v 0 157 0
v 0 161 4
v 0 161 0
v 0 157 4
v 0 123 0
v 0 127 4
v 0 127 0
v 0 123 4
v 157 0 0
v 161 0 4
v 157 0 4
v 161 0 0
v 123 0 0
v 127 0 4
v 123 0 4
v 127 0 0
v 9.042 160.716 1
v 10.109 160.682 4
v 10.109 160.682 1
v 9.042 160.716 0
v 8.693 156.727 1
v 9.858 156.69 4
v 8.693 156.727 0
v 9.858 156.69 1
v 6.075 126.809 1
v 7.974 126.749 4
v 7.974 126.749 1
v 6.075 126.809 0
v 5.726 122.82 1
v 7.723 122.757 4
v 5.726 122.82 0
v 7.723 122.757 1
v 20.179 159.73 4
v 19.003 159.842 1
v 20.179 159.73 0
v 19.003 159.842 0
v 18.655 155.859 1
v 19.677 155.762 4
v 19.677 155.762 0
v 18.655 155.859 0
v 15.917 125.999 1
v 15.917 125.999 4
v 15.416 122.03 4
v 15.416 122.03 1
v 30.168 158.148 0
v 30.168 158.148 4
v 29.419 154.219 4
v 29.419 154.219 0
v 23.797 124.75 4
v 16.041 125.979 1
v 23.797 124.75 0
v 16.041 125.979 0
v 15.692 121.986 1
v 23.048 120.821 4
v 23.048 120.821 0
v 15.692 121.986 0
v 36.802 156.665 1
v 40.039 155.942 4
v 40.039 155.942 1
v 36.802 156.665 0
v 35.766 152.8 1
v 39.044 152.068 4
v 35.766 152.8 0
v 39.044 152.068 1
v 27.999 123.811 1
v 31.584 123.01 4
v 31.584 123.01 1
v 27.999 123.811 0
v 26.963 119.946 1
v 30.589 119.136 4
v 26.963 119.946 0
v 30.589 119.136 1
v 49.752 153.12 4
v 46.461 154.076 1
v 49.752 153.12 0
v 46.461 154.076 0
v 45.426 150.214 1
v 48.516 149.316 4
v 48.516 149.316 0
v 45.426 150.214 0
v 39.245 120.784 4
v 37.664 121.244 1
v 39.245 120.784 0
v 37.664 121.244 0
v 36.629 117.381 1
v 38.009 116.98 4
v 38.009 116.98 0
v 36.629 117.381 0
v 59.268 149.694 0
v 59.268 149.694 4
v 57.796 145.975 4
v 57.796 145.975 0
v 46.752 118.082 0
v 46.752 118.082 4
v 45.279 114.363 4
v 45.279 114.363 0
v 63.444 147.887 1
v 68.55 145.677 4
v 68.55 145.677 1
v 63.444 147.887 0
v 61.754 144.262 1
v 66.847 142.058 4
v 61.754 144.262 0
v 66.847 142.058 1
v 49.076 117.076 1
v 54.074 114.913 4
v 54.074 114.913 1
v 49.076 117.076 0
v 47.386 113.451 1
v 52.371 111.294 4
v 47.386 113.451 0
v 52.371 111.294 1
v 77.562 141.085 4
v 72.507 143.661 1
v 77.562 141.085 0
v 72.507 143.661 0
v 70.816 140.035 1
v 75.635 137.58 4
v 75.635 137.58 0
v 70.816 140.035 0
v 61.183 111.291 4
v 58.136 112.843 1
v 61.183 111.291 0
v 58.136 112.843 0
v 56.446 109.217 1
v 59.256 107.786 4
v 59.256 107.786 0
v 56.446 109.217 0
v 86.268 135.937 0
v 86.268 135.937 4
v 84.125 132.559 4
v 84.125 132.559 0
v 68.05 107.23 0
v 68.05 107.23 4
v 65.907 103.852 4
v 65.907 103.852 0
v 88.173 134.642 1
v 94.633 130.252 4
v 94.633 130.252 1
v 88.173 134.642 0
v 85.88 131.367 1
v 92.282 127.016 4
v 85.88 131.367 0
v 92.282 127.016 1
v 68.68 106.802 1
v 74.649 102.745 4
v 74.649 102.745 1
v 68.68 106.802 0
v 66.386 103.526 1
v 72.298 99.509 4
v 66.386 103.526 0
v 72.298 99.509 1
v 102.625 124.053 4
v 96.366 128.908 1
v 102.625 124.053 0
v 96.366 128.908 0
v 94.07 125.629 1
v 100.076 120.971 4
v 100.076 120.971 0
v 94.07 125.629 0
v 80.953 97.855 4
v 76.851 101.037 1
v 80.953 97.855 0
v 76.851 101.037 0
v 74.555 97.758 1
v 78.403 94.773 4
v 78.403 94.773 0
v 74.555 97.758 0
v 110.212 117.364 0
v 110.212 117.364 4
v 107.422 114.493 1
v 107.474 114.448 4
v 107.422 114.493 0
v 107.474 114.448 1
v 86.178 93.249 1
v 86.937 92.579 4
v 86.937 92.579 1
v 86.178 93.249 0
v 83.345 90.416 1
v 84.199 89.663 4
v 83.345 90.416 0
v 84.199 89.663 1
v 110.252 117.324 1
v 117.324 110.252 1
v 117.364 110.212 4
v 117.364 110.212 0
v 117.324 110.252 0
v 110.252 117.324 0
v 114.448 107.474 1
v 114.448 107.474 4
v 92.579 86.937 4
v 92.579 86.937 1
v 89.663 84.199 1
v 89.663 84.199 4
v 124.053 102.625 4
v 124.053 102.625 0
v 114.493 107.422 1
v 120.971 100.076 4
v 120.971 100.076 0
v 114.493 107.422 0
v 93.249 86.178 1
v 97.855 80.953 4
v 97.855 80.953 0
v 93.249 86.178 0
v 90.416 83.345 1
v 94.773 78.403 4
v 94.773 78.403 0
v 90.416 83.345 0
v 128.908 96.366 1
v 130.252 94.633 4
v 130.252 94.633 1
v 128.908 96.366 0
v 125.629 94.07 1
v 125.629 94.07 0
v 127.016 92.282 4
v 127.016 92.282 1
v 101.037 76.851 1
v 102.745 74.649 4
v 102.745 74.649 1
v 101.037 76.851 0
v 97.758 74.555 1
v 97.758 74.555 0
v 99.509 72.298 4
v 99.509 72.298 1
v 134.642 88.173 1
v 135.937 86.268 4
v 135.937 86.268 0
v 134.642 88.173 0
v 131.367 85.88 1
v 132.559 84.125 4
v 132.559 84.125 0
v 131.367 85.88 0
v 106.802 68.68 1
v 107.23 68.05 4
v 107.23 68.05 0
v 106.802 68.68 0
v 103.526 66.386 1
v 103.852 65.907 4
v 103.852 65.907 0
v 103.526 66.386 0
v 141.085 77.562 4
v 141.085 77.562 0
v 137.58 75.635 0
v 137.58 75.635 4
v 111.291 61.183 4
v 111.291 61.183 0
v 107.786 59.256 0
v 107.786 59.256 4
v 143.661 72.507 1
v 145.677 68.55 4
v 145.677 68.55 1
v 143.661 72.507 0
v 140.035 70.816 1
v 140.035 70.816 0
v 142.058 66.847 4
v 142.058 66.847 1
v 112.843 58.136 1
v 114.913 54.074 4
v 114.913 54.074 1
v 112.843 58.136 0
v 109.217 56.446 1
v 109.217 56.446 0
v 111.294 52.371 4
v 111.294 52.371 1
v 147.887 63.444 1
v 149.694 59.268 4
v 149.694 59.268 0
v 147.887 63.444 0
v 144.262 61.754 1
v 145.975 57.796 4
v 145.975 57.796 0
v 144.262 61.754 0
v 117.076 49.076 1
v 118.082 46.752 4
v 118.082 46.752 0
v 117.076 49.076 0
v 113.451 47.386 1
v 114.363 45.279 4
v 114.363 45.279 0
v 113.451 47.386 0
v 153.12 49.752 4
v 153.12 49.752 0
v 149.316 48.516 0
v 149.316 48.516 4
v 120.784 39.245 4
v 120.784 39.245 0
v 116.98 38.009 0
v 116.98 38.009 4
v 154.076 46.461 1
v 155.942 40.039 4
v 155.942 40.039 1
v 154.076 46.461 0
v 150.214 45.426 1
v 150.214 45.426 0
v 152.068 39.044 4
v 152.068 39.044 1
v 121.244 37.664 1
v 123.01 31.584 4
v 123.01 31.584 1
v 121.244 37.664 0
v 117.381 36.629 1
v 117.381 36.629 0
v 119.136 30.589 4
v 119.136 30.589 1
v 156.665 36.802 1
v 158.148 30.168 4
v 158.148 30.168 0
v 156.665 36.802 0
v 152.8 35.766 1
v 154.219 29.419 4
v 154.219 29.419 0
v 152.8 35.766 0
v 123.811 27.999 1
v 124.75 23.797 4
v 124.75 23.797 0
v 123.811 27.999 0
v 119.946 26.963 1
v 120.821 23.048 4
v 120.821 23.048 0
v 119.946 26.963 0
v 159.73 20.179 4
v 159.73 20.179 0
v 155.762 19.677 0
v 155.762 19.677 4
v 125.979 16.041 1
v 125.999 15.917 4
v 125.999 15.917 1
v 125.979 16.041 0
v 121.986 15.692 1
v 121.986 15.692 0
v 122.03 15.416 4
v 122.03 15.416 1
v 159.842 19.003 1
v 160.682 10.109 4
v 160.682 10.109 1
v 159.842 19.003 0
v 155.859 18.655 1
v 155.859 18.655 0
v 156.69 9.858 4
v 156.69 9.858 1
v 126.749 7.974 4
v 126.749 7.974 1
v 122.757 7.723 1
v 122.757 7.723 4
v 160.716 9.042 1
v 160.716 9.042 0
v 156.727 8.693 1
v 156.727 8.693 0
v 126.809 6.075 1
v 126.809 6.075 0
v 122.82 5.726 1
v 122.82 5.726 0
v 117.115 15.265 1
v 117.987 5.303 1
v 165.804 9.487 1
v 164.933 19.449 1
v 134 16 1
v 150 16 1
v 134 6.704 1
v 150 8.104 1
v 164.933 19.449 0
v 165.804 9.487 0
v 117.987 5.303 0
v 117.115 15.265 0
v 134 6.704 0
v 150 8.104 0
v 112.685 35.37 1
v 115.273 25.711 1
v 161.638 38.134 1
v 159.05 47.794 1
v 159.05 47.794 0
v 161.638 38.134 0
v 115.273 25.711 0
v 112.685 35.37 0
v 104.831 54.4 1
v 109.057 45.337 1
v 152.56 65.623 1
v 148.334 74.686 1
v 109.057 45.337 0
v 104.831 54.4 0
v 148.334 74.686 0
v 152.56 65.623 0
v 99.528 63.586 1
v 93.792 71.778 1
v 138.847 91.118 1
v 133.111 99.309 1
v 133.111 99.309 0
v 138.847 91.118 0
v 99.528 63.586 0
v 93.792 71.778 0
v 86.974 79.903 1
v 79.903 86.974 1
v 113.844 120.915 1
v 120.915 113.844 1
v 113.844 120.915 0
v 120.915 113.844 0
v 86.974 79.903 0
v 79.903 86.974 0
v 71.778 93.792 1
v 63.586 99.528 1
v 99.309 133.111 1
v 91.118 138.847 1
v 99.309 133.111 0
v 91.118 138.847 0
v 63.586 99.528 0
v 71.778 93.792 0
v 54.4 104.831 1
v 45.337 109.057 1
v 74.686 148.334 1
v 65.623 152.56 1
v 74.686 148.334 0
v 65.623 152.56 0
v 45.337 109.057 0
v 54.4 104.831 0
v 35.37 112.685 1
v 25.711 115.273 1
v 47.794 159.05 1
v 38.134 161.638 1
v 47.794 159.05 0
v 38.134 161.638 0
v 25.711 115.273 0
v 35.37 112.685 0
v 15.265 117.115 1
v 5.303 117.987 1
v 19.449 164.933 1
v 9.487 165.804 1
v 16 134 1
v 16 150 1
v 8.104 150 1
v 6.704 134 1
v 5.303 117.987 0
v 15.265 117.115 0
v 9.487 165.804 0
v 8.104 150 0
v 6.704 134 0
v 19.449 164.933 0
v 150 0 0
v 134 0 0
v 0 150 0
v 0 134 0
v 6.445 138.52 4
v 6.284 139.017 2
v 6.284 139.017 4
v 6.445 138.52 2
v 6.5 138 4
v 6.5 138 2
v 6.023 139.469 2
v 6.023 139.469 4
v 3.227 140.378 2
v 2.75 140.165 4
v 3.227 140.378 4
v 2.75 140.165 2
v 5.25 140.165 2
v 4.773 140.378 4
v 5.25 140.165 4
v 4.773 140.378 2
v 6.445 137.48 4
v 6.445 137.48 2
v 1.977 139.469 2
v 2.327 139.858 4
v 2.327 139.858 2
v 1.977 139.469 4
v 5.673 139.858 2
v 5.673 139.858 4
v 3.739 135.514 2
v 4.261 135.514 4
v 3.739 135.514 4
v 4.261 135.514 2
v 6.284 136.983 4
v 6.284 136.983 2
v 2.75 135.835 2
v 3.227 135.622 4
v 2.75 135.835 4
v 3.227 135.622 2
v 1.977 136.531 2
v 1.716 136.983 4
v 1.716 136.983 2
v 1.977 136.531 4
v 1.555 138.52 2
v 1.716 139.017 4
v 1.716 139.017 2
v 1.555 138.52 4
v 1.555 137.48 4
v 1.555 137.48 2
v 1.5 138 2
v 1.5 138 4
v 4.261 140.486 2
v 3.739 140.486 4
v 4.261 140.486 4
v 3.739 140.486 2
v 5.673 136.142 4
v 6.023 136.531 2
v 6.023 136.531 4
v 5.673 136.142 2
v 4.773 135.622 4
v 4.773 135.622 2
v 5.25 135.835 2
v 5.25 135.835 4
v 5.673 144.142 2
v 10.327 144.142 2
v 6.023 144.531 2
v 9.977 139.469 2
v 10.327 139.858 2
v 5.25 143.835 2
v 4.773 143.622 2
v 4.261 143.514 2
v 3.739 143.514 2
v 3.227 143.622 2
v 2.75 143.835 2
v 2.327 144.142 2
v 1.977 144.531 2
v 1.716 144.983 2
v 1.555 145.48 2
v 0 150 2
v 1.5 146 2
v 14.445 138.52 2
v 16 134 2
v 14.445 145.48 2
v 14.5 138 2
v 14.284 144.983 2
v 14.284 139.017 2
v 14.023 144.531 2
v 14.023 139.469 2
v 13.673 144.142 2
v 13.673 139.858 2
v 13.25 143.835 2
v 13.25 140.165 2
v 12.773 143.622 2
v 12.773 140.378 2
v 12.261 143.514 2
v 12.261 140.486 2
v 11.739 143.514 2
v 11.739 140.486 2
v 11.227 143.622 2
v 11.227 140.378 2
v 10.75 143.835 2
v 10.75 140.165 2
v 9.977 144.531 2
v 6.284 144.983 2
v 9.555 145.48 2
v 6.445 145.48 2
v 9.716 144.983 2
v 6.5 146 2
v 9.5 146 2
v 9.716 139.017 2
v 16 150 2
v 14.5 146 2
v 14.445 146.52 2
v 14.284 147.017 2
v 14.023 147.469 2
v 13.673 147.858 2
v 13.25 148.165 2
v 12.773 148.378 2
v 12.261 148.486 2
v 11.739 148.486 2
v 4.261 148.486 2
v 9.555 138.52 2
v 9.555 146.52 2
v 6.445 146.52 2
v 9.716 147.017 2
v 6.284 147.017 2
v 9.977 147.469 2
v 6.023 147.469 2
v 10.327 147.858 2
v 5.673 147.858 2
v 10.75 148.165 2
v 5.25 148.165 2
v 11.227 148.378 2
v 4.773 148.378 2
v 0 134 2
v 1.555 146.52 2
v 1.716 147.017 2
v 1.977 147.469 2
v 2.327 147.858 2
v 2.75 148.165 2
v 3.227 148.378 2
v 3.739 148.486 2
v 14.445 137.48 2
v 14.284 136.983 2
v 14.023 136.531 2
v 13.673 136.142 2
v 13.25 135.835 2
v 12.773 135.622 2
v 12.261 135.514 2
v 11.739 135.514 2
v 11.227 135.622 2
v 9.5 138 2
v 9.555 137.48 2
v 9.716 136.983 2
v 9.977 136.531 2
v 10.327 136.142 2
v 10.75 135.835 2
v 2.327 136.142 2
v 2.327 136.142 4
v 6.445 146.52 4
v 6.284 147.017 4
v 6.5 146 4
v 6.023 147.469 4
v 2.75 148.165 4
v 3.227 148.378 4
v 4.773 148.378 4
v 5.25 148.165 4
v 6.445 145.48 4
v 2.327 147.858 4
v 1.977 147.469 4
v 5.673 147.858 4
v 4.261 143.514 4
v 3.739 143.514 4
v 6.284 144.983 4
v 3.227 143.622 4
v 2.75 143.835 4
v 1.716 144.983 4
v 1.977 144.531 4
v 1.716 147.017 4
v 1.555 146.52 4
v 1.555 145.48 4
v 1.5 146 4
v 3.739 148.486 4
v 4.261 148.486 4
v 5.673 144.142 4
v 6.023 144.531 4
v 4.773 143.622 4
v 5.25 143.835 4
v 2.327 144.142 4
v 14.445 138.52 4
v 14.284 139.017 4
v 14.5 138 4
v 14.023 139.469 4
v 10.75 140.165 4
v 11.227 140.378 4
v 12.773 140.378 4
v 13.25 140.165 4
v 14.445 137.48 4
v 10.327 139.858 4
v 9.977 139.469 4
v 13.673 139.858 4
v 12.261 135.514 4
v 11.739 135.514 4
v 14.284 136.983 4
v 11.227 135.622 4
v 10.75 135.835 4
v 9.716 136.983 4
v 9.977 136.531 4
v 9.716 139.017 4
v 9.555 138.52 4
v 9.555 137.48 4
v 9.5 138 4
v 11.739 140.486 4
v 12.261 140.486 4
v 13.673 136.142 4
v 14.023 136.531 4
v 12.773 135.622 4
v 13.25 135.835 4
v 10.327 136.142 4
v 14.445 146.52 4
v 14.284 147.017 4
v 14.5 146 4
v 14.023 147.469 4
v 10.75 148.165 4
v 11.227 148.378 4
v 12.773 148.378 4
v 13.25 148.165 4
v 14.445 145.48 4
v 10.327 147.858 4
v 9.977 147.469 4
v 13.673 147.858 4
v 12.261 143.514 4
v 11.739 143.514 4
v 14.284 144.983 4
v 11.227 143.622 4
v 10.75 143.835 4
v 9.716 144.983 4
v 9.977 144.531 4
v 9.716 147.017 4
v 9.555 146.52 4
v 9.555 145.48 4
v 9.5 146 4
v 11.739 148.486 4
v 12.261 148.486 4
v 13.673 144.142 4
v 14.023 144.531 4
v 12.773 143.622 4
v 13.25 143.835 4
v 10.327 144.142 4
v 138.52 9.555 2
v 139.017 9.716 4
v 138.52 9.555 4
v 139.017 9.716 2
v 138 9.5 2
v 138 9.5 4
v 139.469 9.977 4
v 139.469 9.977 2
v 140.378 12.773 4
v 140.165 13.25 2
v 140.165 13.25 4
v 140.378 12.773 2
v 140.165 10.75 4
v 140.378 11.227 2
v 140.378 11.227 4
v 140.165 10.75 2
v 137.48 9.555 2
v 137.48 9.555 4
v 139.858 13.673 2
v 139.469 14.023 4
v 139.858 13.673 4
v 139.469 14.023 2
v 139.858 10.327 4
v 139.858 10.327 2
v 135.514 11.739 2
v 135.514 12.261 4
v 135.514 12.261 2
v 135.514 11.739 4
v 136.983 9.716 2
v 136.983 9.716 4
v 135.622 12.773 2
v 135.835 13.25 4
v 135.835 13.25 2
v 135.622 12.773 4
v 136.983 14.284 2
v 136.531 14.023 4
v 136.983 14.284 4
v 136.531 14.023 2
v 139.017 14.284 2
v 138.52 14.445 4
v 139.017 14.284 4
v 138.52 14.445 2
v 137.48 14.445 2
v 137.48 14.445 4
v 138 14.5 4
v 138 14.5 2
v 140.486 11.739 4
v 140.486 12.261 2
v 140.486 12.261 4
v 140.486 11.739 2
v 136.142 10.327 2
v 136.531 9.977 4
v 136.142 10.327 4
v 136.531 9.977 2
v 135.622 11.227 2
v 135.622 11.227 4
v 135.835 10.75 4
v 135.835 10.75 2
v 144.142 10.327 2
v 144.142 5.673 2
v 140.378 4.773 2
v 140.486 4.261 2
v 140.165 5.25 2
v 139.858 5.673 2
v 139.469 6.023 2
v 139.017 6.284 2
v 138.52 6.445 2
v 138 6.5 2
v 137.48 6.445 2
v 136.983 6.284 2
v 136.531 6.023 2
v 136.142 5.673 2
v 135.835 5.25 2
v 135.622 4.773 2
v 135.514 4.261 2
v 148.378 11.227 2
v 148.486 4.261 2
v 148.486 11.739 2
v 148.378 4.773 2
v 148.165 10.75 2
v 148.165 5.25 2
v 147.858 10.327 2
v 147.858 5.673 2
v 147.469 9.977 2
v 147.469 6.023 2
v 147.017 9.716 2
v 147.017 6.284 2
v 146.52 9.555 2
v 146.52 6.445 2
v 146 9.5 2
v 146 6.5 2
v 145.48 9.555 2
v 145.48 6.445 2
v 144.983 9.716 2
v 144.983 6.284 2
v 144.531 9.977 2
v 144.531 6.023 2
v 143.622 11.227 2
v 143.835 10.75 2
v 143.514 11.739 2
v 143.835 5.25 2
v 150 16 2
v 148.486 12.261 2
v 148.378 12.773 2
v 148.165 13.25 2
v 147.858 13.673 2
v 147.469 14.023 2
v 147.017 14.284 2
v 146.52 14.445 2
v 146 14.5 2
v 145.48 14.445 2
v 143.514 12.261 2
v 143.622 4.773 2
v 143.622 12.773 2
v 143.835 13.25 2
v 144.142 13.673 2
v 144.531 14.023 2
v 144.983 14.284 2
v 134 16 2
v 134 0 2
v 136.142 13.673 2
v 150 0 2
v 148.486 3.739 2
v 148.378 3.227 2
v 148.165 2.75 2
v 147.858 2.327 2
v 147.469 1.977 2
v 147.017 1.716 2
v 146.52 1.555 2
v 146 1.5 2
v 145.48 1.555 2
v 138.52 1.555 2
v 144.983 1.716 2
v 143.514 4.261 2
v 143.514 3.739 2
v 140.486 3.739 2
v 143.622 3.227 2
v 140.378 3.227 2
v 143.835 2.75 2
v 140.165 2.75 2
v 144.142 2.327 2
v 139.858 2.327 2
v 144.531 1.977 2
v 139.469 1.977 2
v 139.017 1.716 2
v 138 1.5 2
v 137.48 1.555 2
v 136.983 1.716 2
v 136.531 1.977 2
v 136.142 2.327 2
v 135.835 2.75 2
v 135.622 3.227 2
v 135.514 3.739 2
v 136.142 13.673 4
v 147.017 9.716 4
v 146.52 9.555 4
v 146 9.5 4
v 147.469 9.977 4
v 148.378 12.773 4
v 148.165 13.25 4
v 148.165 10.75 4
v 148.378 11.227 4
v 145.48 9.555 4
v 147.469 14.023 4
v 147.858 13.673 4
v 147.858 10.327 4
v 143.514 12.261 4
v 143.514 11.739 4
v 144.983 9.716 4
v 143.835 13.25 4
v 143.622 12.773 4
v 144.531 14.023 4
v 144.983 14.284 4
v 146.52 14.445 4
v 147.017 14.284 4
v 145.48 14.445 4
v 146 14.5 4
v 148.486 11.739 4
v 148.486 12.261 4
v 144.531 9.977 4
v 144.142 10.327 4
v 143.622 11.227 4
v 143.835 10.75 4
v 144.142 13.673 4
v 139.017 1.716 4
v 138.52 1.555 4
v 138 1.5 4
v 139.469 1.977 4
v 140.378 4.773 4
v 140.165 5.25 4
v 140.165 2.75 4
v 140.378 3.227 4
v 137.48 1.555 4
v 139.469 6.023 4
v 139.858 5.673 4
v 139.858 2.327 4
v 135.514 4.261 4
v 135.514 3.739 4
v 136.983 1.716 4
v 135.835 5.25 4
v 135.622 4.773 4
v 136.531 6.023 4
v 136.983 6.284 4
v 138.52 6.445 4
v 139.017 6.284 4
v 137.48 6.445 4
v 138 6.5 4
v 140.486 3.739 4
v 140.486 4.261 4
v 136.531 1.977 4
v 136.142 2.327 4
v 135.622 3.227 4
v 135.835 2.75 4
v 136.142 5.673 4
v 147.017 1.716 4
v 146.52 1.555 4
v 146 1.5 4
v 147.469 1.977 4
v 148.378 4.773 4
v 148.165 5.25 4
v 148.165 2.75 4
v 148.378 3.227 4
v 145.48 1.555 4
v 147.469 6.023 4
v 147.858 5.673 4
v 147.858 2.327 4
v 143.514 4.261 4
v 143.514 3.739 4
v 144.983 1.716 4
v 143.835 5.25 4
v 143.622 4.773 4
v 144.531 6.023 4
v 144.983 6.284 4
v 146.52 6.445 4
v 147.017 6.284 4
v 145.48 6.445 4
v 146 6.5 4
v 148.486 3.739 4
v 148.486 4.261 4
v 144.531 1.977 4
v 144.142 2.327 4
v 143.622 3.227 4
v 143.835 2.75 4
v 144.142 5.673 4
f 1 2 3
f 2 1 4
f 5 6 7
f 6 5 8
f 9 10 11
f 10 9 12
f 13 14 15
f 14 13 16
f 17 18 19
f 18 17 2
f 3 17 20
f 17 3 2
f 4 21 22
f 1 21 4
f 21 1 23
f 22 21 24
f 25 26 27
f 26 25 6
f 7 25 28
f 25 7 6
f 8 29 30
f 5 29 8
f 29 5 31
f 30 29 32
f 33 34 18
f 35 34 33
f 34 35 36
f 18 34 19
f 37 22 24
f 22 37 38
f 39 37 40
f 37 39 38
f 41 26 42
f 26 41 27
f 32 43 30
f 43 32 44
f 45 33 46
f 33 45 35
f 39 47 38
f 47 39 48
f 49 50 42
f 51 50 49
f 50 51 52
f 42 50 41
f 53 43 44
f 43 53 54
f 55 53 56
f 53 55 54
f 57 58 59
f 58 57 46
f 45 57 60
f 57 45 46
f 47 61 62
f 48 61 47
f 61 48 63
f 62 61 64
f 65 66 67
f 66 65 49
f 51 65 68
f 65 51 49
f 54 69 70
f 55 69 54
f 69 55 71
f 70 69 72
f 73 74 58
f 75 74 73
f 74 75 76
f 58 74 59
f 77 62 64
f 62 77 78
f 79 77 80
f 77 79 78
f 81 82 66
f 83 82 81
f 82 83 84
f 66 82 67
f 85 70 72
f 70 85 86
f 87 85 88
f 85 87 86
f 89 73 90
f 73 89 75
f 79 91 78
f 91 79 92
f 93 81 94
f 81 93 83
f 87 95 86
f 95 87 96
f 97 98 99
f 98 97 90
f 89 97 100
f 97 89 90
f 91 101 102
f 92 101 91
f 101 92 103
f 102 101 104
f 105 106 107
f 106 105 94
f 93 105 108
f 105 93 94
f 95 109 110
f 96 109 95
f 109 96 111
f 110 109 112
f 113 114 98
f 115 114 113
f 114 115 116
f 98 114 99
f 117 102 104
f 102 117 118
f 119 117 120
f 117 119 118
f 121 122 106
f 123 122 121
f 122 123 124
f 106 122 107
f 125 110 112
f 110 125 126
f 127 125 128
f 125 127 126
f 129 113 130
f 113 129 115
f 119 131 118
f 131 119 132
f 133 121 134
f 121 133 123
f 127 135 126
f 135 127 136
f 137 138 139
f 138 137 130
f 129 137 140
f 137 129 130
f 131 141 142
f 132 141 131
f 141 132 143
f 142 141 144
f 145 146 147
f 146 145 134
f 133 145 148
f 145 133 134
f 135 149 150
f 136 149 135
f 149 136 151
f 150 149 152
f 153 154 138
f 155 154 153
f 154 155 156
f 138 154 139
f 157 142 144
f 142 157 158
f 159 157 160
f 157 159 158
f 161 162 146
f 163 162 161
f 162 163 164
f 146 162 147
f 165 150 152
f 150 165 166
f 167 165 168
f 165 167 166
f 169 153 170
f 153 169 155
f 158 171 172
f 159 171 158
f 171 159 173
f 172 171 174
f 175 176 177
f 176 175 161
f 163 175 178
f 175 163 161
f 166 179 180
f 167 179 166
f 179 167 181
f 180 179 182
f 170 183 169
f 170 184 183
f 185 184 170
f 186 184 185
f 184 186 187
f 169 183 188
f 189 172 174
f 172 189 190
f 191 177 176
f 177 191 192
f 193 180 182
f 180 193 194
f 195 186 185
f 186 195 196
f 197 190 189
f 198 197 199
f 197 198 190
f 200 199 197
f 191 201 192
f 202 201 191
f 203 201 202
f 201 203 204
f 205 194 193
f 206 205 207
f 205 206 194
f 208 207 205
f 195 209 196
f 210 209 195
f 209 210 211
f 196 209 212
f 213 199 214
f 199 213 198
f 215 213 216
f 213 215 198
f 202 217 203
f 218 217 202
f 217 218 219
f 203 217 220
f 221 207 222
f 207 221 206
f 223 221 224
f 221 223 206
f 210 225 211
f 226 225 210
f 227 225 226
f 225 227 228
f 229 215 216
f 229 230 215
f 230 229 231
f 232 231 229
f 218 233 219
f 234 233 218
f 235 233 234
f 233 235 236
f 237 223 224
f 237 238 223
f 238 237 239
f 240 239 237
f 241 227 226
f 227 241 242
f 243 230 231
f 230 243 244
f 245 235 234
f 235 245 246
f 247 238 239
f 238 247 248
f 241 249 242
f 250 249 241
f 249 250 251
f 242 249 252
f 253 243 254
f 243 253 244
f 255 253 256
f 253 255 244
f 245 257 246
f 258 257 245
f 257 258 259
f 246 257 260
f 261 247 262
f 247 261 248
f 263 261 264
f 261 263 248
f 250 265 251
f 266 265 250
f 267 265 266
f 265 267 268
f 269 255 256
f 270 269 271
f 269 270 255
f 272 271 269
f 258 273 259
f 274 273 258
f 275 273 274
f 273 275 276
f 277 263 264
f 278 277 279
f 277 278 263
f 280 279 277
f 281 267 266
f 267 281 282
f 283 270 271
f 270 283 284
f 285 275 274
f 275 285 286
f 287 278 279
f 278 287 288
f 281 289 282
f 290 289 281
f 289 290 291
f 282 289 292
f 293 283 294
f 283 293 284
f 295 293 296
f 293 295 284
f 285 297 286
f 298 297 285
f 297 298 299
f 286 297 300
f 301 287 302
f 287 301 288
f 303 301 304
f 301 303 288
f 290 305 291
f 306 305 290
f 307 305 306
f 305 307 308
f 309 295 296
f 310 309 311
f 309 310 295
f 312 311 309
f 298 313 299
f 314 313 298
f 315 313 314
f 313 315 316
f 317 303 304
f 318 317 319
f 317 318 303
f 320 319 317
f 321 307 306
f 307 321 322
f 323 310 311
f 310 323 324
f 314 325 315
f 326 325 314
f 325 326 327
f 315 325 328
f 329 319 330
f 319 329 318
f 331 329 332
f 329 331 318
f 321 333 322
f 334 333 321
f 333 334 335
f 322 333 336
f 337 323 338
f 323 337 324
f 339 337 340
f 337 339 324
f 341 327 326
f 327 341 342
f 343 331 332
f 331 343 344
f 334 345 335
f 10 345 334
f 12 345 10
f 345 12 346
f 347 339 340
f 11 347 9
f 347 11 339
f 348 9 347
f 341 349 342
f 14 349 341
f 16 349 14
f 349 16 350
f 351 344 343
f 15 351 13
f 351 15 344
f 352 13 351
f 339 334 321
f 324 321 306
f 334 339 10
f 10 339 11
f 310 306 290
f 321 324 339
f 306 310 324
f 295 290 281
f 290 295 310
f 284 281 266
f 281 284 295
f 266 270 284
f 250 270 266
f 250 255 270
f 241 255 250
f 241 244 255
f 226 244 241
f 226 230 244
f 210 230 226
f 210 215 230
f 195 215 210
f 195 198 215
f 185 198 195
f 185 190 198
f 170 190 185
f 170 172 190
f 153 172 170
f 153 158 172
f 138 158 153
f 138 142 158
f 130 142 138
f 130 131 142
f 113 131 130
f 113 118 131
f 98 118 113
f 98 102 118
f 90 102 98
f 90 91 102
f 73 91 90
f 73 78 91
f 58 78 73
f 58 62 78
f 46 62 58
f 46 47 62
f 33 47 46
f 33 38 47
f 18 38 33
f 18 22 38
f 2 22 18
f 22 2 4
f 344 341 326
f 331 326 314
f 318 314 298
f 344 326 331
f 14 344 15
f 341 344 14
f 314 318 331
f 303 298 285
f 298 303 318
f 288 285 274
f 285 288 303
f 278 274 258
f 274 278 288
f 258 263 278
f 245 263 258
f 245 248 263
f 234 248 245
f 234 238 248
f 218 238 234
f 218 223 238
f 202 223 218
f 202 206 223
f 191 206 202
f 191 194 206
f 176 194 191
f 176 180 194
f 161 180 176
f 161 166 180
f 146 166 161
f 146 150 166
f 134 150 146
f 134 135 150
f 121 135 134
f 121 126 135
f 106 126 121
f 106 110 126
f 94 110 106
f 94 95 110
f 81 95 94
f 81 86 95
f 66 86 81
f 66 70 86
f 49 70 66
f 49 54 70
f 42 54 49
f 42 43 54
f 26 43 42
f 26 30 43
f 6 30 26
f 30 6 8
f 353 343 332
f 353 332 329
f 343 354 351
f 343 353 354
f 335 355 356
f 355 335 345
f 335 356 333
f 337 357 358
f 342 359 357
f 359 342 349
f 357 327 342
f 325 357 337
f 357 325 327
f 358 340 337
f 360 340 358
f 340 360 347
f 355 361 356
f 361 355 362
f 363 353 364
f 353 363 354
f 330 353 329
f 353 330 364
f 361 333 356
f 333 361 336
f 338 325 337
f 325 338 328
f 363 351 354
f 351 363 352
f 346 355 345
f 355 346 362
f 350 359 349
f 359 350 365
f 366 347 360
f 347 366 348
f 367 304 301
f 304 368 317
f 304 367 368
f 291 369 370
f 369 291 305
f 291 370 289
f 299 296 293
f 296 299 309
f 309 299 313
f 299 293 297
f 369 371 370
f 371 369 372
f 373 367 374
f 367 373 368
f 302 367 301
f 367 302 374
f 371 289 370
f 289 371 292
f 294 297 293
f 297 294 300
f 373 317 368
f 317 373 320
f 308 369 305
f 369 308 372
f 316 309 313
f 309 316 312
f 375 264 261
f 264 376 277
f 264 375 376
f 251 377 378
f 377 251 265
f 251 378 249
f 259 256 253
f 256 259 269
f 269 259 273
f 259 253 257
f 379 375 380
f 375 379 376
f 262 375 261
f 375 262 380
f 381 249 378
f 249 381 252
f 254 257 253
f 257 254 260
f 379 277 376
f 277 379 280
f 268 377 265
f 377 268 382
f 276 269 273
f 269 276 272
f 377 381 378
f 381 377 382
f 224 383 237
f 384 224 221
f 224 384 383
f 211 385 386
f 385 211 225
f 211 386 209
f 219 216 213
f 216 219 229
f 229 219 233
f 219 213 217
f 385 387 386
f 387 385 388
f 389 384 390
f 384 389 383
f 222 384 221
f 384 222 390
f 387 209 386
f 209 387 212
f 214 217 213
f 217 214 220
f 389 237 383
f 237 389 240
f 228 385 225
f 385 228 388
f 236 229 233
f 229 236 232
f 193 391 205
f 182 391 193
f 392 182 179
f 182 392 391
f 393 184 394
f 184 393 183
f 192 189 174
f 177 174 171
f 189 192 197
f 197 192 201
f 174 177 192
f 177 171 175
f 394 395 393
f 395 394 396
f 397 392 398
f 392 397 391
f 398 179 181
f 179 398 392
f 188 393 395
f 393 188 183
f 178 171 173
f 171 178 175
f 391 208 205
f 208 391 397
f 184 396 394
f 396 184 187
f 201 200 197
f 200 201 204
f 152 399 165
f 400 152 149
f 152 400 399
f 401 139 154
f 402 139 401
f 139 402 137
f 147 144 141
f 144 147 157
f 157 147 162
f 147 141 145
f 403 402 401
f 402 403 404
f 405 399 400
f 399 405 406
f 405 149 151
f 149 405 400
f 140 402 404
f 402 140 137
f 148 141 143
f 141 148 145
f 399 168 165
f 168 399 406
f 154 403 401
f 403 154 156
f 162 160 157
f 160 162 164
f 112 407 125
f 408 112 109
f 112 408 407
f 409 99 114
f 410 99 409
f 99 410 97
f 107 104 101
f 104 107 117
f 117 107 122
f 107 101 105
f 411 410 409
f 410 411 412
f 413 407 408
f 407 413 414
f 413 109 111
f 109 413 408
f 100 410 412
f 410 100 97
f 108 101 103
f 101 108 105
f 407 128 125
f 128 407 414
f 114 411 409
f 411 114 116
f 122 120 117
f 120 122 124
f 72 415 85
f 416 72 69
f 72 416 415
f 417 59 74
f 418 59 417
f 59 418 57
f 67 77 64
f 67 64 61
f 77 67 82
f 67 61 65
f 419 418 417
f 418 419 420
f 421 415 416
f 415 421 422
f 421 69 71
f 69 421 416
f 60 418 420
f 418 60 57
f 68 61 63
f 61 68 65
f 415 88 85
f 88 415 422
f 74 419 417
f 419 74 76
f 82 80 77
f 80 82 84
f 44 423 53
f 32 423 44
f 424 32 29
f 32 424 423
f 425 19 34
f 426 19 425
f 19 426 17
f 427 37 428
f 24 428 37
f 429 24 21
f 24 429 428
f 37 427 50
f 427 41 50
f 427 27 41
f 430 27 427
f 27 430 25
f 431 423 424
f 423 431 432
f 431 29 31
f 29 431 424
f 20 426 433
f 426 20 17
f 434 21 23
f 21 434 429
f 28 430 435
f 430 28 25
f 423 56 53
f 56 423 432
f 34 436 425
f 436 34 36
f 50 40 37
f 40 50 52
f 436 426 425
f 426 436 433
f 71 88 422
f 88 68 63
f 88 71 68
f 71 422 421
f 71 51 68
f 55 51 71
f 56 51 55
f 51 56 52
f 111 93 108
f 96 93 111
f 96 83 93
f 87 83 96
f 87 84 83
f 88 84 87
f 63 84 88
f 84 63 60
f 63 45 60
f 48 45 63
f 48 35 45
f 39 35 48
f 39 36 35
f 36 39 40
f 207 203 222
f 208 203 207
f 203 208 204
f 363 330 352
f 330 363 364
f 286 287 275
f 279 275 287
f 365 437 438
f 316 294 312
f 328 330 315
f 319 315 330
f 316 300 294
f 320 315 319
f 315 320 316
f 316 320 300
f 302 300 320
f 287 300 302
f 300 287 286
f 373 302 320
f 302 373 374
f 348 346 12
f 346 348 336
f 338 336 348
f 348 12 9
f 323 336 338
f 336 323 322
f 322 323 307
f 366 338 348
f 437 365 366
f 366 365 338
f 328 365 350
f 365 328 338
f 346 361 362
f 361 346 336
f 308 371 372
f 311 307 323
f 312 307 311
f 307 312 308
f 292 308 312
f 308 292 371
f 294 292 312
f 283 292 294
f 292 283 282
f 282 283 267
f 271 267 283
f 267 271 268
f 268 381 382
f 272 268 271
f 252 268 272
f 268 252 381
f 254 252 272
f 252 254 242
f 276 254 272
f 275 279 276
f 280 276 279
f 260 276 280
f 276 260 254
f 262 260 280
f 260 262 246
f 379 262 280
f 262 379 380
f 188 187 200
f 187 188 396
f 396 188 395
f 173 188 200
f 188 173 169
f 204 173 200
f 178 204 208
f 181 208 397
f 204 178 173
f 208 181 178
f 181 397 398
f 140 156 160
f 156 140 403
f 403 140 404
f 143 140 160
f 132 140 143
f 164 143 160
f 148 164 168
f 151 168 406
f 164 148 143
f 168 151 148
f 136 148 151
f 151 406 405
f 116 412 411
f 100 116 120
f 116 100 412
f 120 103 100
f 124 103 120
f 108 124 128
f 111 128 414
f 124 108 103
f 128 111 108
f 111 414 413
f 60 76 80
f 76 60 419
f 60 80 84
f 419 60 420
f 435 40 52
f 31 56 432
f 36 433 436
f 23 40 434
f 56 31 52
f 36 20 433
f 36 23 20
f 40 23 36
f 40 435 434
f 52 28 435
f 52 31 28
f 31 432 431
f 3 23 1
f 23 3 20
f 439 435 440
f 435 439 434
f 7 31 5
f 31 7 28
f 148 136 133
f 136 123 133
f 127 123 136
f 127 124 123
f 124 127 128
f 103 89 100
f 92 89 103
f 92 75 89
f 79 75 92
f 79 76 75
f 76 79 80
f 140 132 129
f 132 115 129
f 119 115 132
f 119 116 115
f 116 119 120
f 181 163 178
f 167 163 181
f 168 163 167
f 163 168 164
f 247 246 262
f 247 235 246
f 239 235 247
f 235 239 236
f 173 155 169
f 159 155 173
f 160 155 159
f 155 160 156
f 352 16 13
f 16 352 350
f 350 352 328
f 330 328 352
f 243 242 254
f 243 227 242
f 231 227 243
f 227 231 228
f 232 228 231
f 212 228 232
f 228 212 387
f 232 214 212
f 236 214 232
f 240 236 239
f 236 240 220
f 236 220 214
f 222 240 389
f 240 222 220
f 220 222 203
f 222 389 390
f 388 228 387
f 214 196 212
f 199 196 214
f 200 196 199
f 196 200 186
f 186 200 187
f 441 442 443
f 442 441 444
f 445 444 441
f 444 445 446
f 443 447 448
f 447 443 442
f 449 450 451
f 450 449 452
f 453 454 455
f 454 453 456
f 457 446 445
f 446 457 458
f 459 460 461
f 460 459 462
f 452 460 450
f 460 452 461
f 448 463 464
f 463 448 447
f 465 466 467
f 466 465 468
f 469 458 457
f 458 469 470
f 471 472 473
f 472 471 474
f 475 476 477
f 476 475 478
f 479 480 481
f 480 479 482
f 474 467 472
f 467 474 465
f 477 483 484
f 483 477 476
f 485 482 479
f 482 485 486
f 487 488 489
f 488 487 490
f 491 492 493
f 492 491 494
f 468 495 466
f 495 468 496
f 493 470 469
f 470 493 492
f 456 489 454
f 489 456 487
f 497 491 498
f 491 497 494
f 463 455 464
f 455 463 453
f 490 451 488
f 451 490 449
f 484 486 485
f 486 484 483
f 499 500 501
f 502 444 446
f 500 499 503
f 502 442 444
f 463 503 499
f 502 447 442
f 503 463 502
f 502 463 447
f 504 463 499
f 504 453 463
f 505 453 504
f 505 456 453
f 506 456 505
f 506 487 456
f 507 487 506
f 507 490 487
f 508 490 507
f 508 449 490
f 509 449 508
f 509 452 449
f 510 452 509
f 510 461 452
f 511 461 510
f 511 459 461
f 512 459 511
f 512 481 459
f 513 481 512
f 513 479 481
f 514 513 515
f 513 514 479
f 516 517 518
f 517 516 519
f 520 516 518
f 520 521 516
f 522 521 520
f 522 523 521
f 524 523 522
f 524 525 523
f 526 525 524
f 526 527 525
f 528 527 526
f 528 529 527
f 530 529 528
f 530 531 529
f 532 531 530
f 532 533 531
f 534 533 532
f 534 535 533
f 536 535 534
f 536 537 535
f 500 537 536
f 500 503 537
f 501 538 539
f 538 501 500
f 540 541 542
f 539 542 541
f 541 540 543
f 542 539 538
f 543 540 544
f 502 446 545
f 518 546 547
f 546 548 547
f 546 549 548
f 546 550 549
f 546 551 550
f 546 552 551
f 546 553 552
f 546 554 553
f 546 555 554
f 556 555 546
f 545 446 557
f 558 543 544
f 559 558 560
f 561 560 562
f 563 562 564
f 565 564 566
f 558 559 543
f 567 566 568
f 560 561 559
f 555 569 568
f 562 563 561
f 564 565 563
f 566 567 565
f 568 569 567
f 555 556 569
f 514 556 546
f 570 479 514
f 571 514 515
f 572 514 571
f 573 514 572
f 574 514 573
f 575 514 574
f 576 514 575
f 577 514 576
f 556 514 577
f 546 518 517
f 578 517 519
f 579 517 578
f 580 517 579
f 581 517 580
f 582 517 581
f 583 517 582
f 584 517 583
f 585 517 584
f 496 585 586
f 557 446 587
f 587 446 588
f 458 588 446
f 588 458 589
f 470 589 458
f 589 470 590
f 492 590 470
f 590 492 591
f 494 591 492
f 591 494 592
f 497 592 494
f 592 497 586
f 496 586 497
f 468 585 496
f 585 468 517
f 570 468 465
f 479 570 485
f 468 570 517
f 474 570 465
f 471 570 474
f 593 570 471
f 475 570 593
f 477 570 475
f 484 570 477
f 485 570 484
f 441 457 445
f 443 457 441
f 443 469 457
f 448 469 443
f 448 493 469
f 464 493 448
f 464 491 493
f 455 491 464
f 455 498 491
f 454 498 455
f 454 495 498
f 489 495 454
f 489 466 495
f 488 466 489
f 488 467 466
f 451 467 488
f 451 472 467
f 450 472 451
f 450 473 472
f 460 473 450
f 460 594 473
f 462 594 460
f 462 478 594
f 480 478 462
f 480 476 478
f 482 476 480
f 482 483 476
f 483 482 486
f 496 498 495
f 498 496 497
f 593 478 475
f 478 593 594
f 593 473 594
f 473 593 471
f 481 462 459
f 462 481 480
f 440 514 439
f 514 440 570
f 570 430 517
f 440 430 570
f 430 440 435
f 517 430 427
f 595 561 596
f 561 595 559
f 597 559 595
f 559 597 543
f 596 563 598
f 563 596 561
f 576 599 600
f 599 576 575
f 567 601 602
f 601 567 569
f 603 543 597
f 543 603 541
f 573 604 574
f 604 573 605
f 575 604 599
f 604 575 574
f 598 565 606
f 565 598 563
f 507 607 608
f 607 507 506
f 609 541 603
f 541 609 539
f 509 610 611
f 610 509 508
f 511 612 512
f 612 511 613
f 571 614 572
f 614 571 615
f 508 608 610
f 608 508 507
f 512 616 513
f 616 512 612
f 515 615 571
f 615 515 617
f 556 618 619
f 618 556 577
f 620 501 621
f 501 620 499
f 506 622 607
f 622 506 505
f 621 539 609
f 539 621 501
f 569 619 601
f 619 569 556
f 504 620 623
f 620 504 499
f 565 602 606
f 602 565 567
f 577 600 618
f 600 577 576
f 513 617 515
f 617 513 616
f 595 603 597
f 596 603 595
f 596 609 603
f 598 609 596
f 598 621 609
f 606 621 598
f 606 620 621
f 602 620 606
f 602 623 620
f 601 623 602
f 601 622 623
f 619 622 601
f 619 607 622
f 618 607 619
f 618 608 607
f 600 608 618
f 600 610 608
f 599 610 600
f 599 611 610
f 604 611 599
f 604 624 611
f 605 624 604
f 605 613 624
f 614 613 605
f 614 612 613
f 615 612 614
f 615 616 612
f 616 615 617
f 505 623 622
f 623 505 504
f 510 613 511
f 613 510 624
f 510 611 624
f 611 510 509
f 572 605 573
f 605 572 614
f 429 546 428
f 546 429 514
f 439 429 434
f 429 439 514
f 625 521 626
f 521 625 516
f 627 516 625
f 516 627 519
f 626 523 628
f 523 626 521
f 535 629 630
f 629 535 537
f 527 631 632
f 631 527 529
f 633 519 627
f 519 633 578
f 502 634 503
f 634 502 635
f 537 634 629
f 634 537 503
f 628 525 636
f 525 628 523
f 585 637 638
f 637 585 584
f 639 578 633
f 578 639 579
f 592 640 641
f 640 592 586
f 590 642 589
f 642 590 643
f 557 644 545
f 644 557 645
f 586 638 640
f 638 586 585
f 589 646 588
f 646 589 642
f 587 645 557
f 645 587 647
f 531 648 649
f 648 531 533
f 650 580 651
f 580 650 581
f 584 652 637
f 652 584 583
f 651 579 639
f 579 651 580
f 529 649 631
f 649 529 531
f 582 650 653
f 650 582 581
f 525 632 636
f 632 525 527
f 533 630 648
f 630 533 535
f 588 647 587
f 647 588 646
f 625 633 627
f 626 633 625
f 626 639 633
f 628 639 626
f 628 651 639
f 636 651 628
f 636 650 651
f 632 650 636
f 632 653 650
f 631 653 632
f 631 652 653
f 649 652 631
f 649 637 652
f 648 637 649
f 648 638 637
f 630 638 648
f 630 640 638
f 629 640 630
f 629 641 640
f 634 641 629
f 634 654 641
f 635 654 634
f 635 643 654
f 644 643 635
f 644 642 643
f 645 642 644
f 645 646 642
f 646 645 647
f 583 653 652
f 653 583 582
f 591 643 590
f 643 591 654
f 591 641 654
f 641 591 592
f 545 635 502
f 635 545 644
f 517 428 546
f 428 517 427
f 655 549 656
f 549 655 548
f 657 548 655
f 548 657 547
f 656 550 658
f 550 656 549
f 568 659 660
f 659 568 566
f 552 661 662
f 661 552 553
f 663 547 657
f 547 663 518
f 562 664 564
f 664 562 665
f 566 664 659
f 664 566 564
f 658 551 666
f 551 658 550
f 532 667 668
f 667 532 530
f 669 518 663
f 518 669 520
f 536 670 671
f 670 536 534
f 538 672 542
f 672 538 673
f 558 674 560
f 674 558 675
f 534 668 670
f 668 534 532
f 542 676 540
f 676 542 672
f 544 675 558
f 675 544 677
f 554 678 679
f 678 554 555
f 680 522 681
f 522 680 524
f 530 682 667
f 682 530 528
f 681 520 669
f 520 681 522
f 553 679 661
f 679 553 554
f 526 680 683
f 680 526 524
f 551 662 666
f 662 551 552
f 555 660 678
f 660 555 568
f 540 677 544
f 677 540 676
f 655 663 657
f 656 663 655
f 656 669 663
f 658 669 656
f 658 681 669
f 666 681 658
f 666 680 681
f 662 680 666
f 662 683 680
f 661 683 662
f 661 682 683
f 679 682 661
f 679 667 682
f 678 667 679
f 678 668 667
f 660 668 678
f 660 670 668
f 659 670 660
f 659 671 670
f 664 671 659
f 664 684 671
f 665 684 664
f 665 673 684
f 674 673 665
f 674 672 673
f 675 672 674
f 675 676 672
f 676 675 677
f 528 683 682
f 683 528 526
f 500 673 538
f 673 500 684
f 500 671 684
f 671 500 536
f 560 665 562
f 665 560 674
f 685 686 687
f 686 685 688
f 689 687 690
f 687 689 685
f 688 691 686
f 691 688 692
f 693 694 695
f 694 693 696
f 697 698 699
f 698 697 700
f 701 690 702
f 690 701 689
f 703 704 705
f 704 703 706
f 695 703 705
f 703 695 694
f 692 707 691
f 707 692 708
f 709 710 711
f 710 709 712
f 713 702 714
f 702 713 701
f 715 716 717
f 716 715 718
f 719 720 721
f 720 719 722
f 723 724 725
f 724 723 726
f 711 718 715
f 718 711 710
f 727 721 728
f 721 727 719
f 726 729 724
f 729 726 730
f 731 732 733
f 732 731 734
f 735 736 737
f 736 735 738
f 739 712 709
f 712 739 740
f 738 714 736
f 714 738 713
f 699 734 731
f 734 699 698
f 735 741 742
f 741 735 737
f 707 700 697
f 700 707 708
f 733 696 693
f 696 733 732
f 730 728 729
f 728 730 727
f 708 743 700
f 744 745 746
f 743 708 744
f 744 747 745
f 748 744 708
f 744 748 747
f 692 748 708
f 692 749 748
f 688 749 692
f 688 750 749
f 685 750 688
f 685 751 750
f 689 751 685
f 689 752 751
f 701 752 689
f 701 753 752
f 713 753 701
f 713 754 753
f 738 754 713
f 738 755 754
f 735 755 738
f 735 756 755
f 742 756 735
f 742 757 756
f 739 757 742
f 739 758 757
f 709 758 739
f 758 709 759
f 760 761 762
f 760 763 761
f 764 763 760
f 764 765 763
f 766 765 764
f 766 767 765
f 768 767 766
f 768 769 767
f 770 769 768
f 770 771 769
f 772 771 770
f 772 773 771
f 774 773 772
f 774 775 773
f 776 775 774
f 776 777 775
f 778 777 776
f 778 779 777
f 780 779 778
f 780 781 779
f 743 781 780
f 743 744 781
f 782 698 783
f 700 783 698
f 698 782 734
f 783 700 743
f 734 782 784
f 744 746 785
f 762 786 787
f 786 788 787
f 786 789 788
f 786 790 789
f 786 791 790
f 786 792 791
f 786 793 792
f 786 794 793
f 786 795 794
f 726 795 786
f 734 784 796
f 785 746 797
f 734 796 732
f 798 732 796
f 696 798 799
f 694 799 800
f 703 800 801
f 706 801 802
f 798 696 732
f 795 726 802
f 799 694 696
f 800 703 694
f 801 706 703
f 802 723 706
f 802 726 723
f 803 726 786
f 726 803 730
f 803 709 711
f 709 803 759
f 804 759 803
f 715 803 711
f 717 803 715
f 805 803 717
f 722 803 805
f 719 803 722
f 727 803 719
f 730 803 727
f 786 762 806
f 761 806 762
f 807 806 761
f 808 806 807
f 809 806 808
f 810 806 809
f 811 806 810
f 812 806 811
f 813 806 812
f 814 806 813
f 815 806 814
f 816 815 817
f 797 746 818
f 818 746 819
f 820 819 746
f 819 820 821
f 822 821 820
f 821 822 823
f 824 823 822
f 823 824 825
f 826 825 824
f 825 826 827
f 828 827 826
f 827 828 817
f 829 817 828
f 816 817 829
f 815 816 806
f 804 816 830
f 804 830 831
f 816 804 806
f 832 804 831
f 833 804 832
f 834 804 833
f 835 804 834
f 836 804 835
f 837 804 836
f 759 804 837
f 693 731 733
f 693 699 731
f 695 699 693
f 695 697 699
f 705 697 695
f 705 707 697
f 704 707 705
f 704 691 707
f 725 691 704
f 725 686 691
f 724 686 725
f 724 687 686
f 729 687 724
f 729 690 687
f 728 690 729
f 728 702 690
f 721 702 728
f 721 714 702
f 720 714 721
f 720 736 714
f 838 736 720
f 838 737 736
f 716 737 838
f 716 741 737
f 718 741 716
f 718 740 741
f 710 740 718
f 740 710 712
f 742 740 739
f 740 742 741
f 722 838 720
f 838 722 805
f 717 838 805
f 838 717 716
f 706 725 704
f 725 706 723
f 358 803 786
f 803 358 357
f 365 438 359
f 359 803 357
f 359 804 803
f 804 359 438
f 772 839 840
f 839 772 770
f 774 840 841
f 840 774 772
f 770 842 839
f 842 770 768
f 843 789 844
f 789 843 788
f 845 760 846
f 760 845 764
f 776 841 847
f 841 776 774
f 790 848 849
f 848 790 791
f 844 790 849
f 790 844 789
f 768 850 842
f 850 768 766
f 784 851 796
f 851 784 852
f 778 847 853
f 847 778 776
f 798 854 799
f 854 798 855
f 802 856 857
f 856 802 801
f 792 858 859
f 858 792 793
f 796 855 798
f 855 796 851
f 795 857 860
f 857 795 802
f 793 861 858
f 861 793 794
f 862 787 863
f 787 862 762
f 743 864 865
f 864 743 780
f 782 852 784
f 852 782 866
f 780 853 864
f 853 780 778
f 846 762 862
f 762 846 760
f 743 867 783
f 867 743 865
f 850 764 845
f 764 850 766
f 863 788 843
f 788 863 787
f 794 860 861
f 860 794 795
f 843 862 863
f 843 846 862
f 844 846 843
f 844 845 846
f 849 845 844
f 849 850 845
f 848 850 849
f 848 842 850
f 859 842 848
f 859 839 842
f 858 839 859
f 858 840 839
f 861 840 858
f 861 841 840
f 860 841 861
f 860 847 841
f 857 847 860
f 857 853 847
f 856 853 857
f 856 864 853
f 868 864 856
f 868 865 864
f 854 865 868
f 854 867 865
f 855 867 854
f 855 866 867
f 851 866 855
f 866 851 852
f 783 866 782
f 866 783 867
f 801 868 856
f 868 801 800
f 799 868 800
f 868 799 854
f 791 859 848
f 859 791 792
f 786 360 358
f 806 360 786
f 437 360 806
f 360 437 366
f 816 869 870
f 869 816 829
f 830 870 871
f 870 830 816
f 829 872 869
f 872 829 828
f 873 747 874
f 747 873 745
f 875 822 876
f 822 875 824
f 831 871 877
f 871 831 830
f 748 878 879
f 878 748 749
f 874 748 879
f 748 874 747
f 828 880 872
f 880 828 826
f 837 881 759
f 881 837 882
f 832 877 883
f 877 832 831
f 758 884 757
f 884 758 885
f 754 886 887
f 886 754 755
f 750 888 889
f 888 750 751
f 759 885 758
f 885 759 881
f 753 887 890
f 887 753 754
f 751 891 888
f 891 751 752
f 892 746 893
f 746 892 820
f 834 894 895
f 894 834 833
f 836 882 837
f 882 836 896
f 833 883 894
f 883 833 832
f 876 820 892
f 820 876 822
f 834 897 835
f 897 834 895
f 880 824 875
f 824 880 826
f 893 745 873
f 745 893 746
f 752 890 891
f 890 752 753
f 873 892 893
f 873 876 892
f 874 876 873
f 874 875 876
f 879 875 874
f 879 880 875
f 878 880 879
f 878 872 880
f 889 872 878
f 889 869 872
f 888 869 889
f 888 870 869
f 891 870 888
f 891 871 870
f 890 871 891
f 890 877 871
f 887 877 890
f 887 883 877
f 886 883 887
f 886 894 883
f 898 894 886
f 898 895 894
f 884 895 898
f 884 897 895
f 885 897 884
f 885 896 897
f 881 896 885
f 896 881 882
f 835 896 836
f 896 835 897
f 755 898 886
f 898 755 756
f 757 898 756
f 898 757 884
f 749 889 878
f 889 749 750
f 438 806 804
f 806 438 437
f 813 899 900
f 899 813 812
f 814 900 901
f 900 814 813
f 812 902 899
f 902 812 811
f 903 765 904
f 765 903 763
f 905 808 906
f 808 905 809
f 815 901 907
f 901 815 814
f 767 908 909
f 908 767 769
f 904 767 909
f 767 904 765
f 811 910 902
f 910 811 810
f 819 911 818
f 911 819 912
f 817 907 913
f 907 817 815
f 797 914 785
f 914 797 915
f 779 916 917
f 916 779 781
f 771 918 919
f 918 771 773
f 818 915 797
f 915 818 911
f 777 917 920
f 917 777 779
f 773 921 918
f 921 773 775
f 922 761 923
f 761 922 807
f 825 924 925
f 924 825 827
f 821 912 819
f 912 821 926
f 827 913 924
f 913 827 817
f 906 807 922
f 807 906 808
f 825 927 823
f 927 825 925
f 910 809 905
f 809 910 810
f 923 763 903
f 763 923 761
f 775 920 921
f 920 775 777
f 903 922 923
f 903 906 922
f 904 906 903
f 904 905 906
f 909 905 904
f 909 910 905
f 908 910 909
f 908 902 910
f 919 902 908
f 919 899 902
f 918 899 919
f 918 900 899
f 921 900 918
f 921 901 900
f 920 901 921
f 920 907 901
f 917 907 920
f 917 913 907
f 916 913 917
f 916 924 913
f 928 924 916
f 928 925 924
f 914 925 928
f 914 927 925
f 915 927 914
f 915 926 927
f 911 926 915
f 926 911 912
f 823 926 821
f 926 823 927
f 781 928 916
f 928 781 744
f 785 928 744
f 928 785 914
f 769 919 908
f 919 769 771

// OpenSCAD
epsilon = 0.0001;

// Try d = 0 for more Geotraxed version
// Try d = -7 for simplified version (more 3D-printer friendly)
// Try d = -9.0001 for extremely simplfied version (more cost friendly)

d = 0;
d = -7;
d = -(9+epsilon);

curvedTrackWithJoin();

module curvedTrackWithJoin() {

intersection () {
 translate([0,0,d]) curvedTrack();
 translate([0,0,10]) cube(size=[400,400,20], center=true);
}

translate([8,142,0]) elgoPlate();
rotate([0,0,-90]) translate([-8,142,0]) elgoPlate();

}

module elgoPlate() {
   for(i=[-1,1]) {
		for(j=[-1,1]) {
			translate([i*4,j*4,0]) elgoPlot();
		}
	}
}

module elgoPlot() {
	translate([0,0,2]) cylinder(h = 2, r=2.5, $fs=0.5);
	translate([0,0,1]) cube(size=[8,8,2], center=true);
}

module curvedTrack() {

intersection() {
	// un "cube" qui permettra de couper le rail extrud.. .. un quart de cercle
	cube(size = [174, 174, 20], center = false);
	// extrusion rotative d'un profil de rail d..fini par un polygon
	rotate_extrude(convexity= 10, $fn = 100)
		translate([142,0,0])
		polygon(points=[[0,7],[-25,7],[-30,0],[-32,0],[-25,9],[-19,9],[-19,13],[-15,13],[-15,9],[15,9],[15,13],[19,13],[19,9],[25,9],[32,0],[30,0],[25,7]], paths=[[0,1,2,3,4,5,6,7,8,9,10,11,12,13,14,15,16,17,18,19,20]]);
}

// traverses
for (a = [5,15,25,35,45,55,65,75,85]) // n iterations
{
	rotate([0,0,a])
	translate([118, -5, 9])
	cube(size = [48, 10, 1], center = false);
}

for (a = [5,25,45,65,85]) // n iterations
{
	rotate([0,0,a])
	translate([142,0,0])
	rotate([90,0,0])
	linear_extrude(height=2.5)
		polygon(points=[[-32,0],[-25,9],[25,9],[32,0]], paths=[[0,1,2,3,4,5,6,7,8,9,10,11,12,13,14,15,16,17,18,19,20]]);
}

}
